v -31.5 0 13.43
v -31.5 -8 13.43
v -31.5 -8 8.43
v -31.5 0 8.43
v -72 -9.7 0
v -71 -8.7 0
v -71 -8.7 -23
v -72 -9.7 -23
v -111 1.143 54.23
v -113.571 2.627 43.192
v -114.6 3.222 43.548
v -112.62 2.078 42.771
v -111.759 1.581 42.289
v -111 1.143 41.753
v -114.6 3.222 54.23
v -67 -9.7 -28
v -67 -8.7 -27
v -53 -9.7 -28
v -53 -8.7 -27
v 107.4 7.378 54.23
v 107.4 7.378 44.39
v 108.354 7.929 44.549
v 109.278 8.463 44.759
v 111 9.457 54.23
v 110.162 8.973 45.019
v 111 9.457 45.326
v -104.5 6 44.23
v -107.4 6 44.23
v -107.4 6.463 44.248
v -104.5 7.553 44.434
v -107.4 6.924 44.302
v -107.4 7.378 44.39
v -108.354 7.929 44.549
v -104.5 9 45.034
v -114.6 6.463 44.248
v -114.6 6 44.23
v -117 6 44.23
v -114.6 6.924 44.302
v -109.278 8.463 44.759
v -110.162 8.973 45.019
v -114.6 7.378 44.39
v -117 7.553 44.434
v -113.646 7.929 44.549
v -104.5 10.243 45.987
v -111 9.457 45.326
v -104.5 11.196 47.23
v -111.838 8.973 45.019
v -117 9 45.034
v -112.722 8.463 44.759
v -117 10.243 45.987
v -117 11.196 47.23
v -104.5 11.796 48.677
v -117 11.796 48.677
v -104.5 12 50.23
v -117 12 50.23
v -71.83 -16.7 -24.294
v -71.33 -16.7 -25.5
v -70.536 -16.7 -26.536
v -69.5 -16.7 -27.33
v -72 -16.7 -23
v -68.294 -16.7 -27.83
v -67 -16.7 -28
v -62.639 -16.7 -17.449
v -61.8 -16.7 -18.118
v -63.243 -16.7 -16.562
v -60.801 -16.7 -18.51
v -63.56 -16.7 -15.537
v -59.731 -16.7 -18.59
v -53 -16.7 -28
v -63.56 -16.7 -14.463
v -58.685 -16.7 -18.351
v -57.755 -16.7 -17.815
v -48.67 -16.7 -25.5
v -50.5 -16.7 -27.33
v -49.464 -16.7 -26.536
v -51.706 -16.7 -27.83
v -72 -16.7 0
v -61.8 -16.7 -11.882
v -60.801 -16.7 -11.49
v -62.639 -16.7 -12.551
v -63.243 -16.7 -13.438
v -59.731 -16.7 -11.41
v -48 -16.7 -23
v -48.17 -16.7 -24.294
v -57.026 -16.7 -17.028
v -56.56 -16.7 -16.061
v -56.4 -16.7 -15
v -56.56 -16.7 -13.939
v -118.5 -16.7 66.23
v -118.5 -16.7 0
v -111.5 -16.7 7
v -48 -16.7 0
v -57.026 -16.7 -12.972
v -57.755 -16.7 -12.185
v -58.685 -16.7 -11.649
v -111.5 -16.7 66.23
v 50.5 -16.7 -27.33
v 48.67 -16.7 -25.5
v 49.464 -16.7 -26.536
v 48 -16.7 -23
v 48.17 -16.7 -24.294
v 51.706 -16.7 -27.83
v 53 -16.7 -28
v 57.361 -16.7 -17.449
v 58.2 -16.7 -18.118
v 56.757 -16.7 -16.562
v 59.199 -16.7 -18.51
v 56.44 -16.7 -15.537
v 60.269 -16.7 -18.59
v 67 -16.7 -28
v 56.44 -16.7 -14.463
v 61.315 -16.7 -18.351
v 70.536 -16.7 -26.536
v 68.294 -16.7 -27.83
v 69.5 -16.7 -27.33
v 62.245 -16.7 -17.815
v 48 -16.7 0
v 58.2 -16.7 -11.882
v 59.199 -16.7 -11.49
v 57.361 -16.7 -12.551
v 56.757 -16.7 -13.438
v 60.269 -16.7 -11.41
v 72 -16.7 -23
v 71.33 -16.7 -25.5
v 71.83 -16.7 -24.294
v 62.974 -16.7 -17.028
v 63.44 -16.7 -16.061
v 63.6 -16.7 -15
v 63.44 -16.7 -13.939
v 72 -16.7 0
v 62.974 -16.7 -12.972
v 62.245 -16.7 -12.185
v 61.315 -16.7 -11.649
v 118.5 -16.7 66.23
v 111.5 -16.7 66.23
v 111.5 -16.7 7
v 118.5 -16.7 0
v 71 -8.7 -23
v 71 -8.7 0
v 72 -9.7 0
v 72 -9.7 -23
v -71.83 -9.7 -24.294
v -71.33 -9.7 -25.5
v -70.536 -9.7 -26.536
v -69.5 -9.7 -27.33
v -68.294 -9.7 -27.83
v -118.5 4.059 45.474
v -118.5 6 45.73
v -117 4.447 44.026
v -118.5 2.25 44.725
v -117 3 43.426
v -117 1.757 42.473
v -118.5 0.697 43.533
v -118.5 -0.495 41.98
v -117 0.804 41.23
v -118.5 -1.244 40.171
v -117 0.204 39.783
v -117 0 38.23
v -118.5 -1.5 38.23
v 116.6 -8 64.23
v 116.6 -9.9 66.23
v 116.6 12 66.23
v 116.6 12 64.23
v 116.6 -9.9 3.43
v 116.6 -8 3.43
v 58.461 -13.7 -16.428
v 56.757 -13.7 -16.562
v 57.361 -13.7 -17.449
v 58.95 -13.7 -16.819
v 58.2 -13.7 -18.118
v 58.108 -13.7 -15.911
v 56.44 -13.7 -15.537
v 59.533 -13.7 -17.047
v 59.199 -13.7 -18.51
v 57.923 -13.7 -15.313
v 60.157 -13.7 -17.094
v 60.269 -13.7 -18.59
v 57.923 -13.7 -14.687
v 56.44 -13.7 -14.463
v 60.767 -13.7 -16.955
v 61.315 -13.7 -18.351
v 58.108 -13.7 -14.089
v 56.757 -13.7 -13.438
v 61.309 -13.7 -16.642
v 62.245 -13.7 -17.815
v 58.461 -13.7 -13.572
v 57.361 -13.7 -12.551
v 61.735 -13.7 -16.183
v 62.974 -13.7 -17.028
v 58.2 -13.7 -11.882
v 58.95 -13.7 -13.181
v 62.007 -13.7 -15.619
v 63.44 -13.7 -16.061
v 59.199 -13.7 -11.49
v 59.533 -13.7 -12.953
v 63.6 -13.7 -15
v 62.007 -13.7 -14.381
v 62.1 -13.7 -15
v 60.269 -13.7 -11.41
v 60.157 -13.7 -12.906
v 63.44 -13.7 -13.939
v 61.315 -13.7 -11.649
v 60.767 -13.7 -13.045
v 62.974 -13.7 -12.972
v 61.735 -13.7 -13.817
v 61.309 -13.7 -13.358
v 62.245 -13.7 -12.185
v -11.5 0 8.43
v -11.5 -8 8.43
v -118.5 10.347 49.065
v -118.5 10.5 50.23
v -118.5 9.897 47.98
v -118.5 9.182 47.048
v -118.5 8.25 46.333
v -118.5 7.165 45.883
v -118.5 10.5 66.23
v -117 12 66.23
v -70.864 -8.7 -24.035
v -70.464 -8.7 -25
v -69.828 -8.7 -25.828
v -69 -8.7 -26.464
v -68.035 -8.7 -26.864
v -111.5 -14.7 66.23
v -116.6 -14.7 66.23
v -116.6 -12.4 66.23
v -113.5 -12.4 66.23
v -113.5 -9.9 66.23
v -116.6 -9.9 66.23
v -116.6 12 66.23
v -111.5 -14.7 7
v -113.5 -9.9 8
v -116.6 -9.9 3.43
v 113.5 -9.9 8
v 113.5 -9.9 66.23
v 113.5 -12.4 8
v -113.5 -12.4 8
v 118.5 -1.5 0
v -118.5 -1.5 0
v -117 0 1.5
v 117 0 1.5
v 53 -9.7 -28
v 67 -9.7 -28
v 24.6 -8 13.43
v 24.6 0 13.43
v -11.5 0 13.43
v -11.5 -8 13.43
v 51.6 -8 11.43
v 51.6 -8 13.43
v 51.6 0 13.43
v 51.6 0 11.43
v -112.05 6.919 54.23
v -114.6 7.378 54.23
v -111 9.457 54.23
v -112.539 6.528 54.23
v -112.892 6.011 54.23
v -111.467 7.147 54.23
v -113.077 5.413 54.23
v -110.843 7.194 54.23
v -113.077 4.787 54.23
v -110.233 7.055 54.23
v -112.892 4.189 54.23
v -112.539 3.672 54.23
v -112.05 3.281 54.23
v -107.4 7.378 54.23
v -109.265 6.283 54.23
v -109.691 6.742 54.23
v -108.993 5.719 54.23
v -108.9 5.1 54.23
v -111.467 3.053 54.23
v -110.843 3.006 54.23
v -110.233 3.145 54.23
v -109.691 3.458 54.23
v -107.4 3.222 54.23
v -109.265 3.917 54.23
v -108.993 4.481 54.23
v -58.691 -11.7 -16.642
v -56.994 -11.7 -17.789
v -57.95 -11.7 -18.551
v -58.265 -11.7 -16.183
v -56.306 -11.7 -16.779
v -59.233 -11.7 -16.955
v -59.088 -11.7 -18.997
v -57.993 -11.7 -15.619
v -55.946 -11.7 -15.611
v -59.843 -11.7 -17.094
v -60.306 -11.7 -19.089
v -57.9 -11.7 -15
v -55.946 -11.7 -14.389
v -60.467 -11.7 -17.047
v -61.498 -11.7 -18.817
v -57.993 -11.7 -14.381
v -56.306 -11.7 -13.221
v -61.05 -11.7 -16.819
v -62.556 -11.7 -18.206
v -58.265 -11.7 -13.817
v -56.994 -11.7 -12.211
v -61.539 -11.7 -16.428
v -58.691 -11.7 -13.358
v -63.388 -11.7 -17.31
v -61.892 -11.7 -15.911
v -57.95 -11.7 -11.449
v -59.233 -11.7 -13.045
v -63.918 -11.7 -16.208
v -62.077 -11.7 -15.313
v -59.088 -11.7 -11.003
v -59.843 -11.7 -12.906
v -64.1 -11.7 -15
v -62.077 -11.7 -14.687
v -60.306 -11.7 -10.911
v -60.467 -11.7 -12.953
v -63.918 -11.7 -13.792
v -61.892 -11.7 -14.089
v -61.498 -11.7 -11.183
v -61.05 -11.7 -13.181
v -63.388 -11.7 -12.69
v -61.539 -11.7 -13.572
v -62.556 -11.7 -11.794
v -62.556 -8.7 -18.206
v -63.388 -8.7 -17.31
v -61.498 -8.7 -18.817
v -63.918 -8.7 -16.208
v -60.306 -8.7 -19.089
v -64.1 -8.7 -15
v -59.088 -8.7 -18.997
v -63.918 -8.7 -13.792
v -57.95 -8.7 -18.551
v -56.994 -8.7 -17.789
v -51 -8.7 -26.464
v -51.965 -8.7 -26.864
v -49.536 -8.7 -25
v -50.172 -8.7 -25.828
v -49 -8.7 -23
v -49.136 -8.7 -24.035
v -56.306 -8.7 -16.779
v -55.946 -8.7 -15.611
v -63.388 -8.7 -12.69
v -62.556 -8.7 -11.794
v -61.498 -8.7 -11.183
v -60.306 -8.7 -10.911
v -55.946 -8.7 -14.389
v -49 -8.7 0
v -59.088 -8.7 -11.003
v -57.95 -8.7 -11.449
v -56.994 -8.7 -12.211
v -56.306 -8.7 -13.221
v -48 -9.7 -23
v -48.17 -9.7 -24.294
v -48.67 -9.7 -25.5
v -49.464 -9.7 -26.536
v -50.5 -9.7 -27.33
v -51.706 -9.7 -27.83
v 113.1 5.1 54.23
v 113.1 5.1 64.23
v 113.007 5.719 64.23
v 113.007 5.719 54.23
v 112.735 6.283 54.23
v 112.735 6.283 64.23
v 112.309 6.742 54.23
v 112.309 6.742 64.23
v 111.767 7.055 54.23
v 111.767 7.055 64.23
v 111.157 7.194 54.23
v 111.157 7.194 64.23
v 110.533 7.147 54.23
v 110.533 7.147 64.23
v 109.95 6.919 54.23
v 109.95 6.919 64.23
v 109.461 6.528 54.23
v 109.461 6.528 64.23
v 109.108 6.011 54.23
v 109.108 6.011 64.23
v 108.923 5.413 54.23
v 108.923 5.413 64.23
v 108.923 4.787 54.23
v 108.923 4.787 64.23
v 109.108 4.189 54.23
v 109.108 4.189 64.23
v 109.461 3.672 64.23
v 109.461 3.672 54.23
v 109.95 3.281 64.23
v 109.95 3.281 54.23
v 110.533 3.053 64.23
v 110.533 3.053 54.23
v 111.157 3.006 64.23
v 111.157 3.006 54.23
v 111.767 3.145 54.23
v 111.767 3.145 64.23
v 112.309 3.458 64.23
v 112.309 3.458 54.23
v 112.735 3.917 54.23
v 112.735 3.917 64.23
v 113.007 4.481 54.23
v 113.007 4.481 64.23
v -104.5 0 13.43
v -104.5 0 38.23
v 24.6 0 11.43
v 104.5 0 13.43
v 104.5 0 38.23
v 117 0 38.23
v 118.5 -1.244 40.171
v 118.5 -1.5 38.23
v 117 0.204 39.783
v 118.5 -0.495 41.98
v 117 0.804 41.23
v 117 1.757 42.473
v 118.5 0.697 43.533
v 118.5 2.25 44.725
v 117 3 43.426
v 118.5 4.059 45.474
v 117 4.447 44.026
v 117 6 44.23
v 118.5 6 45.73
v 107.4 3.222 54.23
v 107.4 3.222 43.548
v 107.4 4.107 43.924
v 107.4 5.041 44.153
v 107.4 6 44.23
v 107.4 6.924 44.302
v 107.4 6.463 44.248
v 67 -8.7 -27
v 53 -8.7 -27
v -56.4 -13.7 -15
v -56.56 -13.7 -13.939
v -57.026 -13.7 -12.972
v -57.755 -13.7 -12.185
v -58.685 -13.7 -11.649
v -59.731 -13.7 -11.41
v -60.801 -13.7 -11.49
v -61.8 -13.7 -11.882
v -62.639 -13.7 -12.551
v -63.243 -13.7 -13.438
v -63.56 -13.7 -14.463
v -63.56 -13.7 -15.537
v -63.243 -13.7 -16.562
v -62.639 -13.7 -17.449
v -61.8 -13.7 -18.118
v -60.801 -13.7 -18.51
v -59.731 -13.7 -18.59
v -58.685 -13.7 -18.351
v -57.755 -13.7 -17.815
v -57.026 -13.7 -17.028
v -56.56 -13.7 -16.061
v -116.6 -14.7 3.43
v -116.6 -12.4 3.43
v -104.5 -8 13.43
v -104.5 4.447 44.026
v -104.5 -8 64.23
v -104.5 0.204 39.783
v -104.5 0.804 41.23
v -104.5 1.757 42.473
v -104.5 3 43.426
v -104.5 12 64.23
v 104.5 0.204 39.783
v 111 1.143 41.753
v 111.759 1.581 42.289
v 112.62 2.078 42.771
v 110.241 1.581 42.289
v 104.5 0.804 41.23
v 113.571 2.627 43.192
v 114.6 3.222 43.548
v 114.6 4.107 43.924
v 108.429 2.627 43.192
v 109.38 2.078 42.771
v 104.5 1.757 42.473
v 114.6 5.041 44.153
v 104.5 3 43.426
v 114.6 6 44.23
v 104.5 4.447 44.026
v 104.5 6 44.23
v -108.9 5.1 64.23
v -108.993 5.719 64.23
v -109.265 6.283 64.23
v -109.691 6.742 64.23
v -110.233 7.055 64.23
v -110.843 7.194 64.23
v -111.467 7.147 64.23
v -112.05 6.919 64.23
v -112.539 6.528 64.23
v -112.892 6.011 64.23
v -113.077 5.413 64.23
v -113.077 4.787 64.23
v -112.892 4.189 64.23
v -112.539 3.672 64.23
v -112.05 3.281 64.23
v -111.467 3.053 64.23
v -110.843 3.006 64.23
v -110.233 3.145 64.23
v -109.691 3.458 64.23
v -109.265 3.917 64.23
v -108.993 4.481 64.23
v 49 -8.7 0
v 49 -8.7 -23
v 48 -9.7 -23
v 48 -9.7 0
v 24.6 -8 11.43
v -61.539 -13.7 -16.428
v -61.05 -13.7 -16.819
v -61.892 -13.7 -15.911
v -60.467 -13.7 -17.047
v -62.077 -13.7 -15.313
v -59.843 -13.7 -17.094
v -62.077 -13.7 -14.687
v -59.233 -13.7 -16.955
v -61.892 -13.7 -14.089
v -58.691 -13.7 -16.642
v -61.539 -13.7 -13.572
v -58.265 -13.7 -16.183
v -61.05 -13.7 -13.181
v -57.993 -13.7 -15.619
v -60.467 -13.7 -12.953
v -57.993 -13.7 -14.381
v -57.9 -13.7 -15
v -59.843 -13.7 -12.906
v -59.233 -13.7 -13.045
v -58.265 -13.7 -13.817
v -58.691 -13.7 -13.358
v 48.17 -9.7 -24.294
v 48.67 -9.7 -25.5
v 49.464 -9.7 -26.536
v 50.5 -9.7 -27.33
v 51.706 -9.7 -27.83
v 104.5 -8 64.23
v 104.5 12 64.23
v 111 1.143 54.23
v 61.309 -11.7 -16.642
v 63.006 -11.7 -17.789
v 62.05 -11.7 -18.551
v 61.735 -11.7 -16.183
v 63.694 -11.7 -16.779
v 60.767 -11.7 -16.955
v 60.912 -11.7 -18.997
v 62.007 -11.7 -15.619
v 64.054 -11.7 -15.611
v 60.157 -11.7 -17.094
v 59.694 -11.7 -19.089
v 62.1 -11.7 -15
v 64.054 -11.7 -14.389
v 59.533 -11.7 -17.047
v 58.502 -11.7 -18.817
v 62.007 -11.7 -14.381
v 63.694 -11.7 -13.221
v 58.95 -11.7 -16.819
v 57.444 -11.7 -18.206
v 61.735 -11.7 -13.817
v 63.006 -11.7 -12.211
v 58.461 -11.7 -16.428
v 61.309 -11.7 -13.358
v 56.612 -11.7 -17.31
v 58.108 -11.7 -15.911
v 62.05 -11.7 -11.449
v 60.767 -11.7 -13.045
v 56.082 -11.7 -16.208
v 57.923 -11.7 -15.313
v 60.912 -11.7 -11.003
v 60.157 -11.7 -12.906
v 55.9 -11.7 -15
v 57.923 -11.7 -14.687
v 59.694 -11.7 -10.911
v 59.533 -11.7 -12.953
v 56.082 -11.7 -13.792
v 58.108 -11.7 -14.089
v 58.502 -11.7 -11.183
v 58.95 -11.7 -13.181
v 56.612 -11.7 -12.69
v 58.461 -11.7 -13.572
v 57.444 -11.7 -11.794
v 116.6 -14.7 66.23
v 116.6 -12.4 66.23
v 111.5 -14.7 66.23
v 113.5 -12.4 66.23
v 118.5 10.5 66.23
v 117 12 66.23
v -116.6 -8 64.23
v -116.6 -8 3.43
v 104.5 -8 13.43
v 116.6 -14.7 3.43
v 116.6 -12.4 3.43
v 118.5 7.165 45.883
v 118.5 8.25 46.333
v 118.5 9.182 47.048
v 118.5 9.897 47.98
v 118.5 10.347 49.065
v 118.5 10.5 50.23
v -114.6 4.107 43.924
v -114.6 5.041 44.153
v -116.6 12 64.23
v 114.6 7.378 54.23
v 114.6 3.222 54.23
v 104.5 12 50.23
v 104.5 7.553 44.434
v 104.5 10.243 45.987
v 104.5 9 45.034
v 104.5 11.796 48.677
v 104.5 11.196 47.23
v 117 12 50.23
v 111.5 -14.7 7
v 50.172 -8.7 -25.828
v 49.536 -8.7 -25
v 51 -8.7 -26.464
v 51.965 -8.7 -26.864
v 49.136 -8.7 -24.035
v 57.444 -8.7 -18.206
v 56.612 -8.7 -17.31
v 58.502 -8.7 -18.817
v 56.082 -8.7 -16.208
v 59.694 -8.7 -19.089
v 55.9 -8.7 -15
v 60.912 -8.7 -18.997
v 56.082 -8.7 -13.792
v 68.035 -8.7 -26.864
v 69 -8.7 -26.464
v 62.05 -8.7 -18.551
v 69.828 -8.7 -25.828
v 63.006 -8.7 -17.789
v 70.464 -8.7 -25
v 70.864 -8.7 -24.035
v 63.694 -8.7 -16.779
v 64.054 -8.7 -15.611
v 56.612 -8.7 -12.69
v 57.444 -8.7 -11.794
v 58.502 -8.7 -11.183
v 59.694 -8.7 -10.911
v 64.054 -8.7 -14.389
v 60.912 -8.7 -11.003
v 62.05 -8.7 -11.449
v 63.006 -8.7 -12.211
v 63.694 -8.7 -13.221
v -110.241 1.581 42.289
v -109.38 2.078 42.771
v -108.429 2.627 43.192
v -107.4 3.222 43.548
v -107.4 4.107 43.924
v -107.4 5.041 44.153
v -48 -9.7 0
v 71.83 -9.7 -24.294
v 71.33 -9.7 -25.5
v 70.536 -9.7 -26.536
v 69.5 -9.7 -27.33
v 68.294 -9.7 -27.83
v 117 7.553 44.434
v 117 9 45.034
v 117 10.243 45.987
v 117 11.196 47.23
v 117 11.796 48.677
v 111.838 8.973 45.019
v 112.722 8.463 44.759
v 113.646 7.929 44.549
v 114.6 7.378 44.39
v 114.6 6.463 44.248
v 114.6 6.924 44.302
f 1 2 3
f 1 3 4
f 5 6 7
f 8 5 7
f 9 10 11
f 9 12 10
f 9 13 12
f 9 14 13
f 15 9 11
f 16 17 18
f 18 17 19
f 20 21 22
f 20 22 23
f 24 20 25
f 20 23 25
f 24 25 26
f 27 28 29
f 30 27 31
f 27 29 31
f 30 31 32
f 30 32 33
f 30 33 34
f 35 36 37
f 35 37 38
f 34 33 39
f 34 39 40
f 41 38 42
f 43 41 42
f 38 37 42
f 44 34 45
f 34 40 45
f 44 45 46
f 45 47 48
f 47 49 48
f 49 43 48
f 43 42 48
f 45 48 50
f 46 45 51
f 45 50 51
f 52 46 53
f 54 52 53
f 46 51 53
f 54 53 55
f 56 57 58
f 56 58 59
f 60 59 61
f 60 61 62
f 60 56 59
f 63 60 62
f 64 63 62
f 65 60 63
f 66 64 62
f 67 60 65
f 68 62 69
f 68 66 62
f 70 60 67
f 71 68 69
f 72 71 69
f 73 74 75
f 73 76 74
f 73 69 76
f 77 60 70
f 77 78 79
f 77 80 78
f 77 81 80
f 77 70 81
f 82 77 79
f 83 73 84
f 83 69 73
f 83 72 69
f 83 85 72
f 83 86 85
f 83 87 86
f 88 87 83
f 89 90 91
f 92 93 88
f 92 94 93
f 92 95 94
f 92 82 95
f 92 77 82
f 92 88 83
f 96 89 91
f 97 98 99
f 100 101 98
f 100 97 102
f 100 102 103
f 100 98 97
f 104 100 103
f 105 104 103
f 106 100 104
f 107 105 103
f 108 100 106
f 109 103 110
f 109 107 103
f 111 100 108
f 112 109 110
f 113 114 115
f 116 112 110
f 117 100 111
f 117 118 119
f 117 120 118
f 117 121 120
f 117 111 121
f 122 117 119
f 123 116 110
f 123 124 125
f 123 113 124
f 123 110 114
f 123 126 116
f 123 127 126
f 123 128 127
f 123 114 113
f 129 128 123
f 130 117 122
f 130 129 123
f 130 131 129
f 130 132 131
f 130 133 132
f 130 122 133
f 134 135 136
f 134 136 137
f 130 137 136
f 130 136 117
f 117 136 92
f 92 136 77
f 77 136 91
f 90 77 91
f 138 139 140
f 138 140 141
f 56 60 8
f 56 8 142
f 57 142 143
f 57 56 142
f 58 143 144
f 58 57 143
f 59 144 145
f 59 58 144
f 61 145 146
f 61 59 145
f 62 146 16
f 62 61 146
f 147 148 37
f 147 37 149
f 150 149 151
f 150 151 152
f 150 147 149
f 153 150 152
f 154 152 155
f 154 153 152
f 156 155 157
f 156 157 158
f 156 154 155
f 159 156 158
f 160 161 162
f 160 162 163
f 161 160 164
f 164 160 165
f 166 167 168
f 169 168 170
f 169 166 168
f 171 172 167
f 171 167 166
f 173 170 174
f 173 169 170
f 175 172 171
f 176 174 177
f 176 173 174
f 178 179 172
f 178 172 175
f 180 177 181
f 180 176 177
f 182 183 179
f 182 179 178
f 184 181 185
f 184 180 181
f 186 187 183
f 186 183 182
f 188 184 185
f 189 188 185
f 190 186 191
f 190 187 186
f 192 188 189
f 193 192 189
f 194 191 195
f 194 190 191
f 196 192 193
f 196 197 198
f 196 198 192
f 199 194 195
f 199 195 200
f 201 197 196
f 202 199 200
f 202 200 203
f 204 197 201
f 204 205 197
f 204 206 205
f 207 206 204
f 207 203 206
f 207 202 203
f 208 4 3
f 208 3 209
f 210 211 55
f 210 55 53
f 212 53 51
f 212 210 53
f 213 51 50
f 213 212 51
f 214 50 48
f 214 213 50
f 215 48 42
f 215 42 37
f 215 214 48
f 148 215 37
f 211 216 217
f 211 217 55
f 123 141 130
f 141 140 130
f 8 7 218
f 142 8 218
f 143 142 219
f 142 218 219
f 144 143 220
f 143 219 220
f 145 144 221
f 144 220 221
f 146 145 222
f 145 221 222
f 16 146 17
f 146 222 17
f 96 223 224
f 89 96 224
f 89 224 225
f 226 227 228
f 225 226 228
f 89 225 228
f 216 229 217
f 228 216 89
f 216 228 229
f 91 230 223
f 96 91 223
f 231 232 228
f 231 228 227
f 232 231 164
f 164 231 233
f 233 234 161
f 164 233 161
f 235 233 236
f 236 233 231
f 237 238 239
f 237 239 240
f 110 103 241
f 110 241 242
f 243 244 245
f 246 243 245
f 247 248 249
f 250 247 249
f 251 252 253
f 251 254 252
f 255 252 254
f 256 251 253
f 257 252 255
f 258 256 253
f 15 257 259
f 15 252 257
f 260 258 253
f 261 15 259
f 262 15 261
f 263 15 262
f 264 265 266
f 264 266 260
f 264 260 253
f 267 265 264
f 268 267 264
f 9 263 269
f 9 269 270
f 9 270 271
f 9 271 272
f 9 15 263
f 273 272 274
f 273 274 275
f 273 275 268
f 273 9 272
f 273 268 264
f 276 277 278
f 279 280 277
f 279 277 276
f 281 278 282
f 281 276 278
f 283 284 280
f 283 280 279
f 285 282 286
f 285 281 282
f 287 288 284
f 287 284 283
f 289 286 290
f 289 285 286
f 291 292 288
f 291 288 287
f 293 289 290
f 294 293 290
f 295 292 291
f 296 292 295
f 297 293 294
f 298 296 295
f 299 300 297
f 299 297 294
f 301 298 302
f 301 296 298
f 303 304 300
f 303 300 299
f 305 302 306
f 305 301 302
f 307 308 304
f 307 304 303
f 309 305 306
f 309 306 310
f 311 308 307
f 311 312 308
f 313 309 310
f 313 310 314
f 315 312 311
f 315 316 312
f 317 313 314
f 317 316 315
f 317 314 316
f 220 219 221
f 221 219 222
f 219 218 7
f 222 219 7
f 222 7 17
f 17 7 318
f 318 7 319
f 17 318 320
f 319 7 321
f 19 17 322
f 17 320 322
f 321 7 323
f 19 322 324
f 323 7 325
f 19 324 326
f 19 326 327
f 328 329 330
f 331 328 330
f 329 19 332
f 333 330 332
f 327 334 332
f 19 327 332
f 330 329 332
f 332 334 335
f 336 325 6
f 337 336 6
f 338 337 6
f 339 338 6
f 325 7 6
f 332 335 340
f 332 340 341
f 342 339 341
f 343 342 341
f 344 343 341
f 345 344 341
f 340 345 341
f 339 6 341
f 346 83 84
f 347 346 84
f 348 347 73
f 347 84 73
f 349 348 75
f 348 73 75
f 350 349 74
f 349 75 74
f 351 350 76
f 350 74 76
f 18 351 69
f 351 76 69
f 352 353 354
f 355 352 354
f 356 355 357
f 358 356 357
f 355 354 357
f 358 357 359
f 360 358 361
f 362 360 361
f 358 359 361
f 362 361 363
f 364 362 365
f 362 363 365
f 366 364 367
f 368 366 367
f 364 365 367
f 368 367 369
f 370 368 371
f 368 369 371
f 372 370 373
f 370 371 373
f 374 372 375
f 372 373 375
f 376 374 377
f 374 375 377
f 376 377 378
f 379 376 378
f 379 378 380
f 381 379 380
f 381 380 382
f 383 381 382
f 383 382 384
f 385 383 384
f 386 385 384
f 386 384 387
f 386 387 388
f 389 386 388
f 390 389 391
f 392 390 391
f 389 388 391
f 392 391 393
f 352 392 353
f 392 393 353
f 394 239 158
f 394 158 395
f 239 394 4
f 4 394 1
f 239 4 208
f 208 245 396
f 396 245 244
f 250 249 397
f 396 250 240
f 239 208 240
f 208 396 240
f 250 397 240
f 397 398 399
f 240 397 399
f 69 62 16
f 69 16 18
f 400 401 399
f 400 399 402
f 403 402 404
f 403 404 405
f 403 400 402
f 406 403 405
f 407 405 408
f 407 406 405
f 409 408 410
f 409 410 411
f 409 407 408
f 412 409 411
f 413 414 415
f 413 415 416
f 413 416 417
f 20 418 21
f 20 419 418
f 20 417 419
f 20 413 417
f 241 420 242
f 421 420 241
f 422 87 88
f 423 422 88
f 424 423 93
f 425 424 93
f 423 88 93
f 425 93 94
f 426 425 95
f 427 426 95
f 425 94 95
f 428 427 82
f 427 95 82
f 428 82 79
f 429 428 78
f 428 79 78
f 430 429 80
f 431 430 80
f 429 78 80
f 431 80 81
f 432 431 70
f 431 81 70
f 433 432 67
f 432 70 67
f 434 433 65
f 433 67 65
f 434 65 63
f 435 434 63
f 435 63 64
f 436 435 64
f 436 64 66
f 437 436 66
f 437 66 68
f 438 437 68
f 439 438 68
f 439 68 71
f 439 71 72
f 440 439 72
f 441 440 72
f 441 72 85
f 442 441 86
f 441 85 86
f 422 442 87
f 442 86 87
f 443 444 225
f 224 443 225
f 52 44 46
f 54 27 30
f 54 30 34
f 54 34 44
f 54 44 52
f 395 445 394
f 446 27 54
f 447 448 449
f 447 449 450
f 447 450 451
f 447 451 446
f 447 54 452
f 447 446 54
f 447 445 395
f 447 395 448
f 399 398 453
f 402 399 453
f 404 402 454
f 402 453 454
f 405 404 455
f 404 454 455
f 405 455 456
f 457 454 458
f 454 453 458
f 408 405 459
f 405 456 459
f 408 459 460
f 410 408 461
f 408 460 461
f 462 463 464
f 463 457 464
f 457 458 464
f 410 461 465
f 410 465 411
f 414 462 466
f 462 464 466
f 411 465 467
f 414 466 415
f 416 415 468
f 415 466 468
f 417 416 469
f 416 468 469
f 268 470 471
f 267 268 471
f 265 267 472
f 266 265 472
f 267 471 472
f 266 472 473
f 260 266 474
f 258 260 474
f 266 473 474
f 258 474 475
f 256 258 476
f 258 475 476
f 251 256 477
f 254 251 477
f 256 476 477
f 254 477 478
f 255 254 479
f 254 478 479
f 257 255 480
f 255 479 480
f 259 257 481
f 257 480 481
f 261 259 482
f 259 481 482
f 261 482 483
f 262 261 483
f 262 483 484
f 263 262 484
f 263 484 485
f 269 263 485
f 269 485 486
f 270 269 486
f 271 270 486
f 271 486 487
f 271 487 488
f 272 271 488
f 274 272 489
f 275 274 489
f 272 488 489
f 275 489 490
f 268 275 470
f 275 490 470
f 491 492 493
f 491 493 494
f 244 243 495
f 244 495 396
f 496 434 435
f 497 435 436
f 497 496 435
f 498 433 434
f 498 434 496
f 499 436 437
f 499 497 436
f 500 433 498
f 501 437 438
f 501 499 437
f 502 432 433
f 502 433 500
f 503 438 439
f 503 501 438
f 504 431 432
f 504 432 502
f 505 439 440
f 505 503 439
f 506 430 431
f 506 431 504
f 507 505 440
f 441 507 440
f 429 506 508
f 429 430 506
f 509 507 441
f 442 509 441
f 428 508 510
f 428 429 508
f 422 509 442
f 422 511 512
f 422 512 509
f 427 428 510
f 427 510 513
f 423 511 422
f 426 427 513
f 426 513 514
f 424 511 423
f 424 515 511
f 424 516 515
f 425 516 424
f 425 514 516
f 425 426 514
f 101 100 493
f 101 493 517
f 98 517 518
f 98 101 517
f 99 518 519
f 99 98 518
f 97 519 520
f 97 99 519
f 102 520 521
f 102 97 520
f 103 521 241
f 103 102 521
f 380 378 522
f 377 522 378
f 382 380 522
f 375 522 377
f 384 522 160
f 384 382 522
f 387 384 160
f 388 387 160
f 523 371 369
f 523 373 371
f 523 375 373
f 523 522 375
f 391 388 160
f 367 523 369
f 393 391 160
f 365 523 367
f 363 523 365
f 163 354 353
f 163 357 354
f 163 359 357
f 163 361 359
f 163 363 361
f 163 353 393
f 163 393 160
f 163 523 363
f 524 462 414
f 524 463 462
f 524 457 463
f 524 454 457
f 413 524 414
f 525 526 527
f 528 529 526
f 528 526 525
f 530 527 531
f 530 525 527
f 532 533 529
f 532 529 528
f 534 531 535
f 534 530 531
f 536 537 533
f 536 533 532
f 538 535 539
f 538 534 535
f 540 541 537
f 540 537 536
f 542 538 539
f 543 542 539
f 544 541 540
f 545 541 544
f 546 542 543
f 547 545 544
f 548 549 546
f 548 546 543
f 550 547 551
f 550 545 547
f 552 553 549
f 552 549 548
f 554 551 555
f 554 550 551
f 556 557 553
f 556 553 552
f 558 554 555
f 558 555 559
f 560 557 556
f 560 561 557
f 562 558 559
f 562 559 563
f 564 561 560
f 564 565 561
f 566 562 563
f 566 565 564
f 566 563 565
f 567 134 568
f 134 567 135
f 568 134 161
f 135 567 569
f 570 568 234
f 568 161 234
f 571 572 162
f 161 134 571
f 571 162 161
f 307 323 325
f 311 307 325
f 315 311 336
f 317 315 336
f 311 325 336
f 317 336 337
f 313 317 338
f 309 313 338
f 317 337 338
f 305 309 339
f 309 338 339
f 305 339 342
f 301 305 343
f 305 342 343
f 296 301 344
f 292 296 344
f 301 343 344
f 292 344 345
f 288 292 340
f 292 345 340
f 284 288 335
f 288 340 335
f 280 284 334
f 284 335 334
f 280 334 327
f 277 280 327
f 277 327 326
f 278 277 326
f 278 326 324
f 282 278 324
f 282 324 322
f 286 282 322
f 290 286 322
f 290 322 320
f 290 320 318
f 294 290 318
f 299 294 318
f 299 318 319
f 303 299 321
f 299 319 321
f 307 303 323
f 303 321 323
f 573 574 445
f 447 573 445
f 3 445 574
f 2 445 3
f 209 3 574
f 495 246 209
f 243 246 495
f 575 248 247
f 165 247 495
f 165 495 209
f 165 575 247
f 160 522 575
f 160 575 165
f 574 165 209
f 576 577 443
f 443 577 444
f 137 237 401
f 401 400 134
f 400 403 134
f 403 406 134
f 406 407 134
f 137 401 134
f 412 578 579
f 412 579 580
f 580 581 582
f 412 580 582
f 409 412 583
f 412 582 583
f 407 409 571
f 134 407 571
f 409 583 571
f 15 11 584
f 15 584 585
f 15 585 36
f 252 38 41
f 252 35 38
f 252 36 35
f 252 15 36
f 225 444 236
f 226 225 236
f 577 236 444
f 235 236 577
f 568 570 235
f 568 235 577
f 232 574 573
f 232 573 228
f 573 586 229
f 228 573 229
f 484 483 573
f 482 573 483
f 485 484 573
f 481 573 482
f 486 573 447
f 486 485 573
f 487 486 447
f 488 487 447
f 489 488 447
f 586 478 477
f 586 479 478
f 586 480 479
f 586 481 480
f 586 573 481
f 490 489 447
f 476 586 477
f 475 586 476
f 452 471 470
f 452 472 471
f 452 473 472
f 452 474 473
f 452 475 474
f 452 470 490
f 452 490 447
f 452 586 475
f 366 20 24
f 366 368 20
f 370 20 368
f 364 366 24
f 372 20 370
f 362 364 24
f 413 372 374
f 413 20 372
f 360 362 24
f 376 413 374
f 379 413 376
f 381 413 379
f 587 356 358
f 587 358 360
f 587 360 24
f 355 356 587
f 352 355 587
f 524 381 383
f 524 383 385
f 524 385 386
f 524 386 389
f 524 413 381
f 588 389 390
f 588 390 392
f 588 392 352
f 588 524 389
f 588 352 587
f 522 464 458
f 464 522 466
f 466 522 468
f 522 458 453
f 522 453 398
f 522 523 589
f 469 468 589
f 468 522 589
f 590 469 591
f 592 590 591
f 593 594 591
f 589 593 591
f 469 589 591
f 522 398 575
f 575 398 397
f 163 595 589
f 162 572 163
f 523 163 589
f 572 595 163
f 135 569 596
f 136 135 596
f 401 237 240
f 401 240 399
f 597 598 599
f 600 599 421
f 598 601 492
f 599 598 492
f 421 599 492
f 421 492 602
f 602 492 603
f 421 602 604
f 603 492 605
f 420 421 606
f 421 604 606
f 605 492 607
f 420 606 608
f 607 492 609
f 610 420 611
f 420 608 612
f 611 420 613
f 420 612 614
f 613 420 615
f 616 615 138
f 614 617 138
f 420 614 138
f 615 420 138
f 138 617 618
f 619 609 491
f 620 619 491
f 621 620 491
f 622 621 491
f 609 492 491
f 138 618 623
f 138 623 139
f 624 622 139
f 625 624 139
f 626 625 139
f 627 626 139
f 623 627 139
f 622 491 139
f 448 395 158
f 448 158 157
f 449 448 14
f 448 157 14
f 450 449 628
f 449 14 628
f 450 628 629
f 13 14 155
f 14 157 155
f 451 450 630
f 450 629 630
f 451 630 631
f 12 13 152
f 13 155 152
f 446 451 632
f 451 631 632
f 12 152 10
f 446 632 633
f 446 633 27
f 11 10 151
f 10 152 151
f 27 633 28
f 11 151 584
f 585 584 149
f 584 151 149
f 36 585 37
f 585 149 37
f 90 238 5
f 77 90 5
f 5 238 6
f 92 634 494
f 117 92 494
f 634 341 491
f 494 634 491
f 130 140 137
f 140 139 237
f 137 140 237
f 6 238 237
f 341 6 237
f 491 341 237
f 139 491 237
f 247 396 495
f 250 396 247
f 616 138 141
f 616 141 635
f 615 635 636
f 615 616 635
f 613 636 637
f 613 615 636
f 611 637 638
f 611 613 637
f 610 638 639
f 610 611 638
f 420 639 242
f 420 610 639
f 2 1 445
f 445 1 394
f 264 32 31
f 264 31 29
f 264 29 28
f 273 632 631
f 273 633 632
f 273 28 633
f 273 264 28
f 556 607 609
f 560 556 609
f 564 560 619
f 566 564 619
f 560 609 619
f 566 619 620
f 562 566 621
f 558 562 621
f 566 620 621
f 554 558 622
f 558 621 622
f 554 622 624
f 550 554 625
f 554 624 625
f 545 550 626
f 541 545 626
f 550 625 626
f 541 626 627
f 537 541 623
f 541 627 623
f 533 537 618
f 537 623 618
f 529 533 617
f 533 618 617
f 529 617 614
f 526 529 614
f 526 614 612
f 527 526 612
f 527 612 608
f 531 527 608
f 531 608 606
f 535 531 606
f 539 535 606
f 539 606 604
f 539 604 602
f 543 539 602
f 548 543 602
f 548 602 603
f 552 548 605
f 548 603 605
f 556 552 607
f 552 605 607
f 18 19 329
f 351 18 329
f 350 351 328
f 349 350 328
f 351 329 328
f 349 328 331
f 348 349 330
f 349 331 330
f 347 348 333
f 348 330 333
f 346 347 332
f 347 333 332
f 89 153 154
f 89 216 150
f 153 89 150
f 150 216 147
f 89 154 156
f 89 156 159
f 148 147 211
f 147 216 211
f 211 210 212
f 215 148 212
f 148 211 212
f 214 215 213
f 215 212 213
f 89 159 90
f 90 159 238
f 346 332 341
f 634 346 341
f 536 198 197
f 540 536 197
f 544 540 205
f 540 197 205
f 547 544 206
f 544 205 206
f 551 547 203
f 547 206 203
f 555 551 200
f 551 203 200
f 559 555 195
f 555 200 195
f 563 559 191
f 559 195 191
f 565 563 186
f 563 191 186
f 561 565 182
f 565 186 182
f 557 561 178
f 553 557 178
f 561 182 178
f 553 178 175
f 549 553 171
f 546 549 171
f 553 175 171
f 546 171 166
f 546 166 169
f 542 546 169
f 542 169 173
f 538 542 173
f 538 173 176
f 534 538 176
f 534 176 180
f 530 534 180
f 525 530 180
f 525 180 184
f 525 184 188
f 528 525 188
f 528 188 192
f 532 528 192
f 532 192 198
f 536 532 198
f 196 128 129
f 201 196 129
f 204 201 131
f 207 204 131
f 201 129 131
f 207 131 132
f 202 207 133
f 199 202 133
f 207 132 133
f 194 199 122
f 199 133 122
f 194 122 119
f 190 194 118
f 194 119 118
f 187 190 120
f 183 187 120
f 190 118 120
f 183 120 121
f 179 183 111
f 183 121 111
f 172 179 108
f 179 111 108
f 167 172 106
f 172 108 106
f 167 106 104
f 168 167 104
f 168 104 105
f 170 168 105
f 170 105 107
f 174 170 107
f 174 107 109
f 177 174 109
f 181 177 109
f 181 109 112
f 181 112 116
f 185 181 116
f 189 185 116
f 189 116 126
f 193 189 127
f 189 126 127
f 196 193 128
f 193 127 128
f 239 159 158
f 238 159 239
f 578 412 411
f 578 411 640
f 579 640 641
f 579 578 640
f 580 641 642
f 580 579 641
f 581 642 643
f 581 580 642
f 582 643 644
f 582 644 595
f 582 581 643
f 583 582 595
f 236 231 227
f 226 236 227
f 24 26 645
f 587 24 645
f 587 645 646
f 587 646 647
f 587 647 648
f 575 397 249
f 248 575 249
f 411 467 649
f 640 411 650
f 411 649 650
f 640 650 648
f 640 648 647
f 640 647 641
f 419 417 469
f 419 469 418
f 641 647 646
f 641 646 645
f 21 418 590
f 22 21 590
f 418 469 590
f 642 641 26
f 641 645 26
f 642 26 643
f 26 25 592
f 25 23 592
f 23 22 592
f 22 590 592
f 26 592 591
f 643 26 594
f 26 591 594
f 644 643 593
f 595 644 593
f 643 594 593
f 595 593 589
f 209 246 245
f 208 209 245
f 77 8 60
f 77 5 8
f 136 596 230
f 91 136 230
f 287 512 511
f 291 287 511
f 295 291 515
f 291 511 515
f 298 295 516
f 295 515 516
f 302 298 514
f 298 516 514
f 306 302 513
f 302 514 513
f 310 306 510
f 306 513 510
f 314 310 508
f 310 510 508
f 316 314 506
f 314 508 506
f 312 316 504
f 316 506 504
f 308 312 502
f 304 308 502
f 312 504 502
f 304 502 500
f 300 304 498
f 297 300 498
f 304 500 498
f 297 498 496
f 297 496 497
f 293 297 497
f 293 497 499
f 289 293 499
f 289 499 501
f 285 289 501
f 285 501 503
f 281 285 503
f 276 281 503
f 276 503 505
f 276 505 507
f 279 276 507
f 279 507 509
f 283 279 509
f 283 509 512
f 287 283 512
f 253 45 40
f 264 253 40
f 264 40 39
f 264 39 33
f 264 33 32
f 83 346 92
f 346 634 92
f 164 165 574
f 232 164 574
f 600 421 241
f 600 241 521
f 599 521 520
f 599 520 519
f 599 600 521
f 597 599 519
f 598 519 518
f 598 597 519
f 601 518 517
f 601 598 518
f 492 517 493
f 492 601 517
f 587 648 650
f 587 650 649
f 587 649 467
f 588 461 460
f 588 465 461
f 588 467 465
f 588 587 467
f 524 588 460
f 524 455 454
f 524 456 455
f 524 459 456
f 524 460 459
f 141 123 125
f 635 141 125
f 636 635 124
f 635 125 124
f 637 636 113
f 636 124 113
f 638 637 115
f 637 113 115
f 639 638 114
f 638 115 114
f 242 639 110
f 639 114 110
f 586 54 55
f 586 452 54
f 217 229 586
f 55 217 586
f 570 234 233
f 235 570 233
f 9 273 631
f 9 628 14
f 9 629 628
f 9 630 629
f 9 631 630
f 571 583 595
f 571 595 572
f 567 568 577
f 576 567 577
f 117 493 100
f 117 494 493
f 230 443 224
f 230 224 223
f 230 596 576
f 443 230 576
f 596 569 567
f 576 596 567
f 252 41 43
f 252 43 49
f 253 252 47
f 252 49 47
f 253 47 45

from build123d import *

# Parameters (mm, degrees)
F1_DEPTH  = 8
F3_DEPTH  = 1.9
F5_DEPTH  = 2.5
F7_DEPTH  = 2.3
F9_W      = 14
F9_H      = 22
F10_DEPTH = 12
F11_DEPTH = 2
F12_W     = 12.1
F12_H     = 20
F13_W     = 12.1
F13_H     = 20
F14_DEPTH = 2
F17_R     = 5.99999
F18_R     = 5.99999
F19_DEPTH = 10
F20_DEPTH = 25
F22_R     = 2.1
F21_R     = 2.1
F23_DEPTH = 10
F24_SIZE  = 1.5
F25_W     = 24
F25_H     = 8
F26_DEPTH = 28
F28_R     = 4.1
F27_R     = 4.1
F29_DEPTH = 3
F30_R     = 2.1
F31_DEPTH = 28.701
F32_R     = 3.6
F33_DEPTH = 3
F34_R     = 5
F35_W     = 20
F35_H     = 8
F36_DEPTH = 5
F37_SIZE  = 1
F38_W     = 27
F38_H     = 8
F39_DEPTH = 2


# Not quite as in the source:
# - a fillet or chamfer is up to 0.001 mm smaller than in the source, because OpenCascade refuses the exact size
# - a feature names something its author has since deleted; it is built from what else it names


with BuildPart() as f1:
    # F0 (on Front) → F1 (new body)
    with BuildSketch(Plane.XZ):
        Polygon((-118.5, 0), (118.5, 0), (118.5, 66.23), (104.5, 66.23), (104.5, 13.43), (-104.5, 13.43), (-104.5, 66.23), (-118.5, 66.23), align=None)
    extrude(amount=F1_DEPTH)

    # F2 (on face) → F3 (join)
    with BuildSketch(Plane.XZ.offset(8)):
        Polygon((-116.6, 66.23), (-118.5, 66.23), (-118.5, 0), (118.5, 0), (118.5, 66.23), (116.6, 66.23), (116.6, 3.43), (-116.6, 3.43), align=None)
    extrude(amount=F3_DEPTH)

    # F4 (on face) → F5 (join)
    with BuildSketch(Plane.XZ.offset(9.9)):
        Polygon((-113.5, 66.23), (-118.5, 66.23), (-118.5, 0), (118.5, 0), (118.5, 66.23), (113.5, 66.23), (113.5, 8), (-113.5, 8), align=None)
    extrude(amount=F5_DEPTH)

    # F6 (on face) → F7 (join)
    with BuildSketch(Plane.XZ.offset(12.4)):
        Polygon((-116.6, 66.23), (-118.5, 66.23), (-118.5, 0), (118.5, 0), (118.5, 66.23), (116.6, 66.23), (116.6, 3.43), (-116.6, 3.43), align=None)
    extrude(amount=F7_DEPTH)

    # F9 (on face) → F10 (join)
    with BuildSketch(Plane(origin=(0, 0, 0), x_dir=(-1, 0, 0), z_dir=(0, 1, 0))):
        with Locations((111.5, 55.23)):
            Rectangle(F9_W, F9_H)
        with Locations((-111.5, 55.23)):
            Rectangle(F9_W, F9_H)
    extrude(amount=F10_DEPTH)

    # F8 (on face) → F11 (join)
    with BuildSketch(Plane.XZ.offset(14.7)):
        Polygon((-111.5, 66.23), (-118.5, 66.23), (-118.5, 0), (118.5, 0), (118.5, 66.23), (111.5, 66.23), (111.5, 7), (-111.5, 7), align=None)
    extrude(amount=F11_DEPTH)

    # F12 (on face) + F13 (on face) → F14 (cut)
    with BuildSketch(Plane.XY.offset(66.23)):
        with Locations((-110.55, 2)):
            Rectangle(F12_W, F12_H)
    with BuildSketch(Plane.XY.offset(66.23)):
        with Locations((110.55, 2)):
            Rectangle(F13_W, F13_H)
    extrude(amount=-F14_DEPTH, mode=Mode.SUBTRACT)

    # F17 (radius 6 in the source; OpenCascade refuses exactly that, so slightly less here)
    f17_edges = [f1.edges().sort_by_distance(p)[0] for p in [
        (-111.5, 0, 44.23),
        (-111.5, 12, 44.23),
    ]]
    fillet(f17_edges, radius=F17_R)

    # F18 (radius 6 in the source; OpenCascade refuses exactly that, so slightly less here)
    f18_edges = [f1.edges().sort_by_distance(p)[0] for p in [
        (111.5, 0, 44.23),
        (111.5, 12, 44.23),
    ]]
    fillet(f18_edges, radius=F18_R)

    # F15 (on face) + F16 (on face) → F19 (cut)
    with BuildSketch(Plane(origin=(0, 0, 44.23), x_dir=(1, 0, 0), z_dir=(0, 0, -1))):
        Polygon((111, -1.1430780618), (107.4, -3.2215390309), (107.4, -7.3784609691), (111, -9.4569219382), (114.6, -7.3784609691), (114.6, -3.2215390309), align=None)
    with BuildSketch(Plane(origin=(0, 0, 44.23), x_dir=(1, 0, 0), z_dir=(0, 0, -1))):
        Polygon((-107.4, -7.3784609691), (-107.4, -3.2215390309), (-111, -1.1430780618), (-114.6, -3.2215390309), (-114.6, -7.3784609691), (-111, -9.4569219382), align=None)
    extrude(amount=-F19_DEPTH, mode=Mode.SUBTRACT)

    # F15 (on face) + F16 (on face) → F20 (cut)
    with BuildSketch(Plane(origin=(0, 0, 44.23), x_dir=(1, 0, 0), z_dir=(0, 0, -1))):
        Polygon((111, -1.1430780618), (107.4, -3.2215390309), (107.4, -7.3784609691), (111, -9.4569219382), (114.6, -7.3784609691), (114.6, -3.2215390309), align=None)
    with BuildSketch(Plane(origin=(0, 0, 44.23), x_dir=(1, 0, 0), z_dir=(0, 0, -1))):
        Polygon((-107.4, -7.3784609691), (-107.4, -3.2215390309), (-111, -1.1430780618), (-114.6, -3.2215390309), (-114.6, -7.3784609691), (-111, -9.4569219382), align=None)
    extrude(amount=F20_DEPTH, mode=Mode.SUBTRACT)

    # F22 (on face) + F21 (on face) → F23 (cut, through all)
    with BuildSketch(Plane.XY.offset(64.23)):
        with Locations((111, 5.1)):
            Circle(F22_R)
    with BuildSketch(Plane.XY.offset(64.23)):
        with Locations((-111, 5.1)):
            Circle(F21_R)
    extrude(amount=-F23_DEPTH, mode=Mode.SUBTRACT)

    # F24
    f24_edges = [f1.edges().sort_by_distance(p)[0] for p in [
        (118.5, 0, 19.115005),
        (-118.5, 0, 19.115005),
        (0, 0, 0),
        (118.5, 12, 58.229995),
        (118.5, 10.242644, 45.987356),
        (118.5, 6, 44.23),
        (118.5, 1.757356, 42.472644),
        (-118.5, 1.757356, 42.472644),
        (-118.5, 6, 44.23),
        (-118.5, 10.242644, 45.987356),
        (-118.5, 12, 58.229995),
    ]]
    chamfer(f24_edges, length=F24_SIZE)

    # F25 (on face) → F26 (join)
    with BuildSketch(Plane(origin=(0, 0, 0), x_dir=(1, 0, 0), z_dir=(0, 0, -1))):
        with Locations((-60, 12.7)):
            Rectangle(F25_W, F25_H)
        with Locations((60, 12.7)):
            Rectangle(F25_W, F25_H)
    extrude(amount=F26_DEPTH)

    # F28 (on face) + F27 (on face) → F29 (cut)
    with BuildSketch(Plane(origin=(0, -8.7, 0), x_dir=(-1, 0, 0), z_dir=(0, 1, 0))):
        with Locations((-60, -15)):
            Circle(F28_R)
    with BuildSketch(Plane(origin=(0, -8.7, 0), x_dir=(-1, 0, 0), z_dir=(0, 1, 0))):
        with Locations((60, -15)):
            Circle(F27_R)
    extrude(amount=-F29_DEPTH, mode=Mode.SUBTRACT)

    # F30 (on face) → F31 (cut, through all)
    with BuildSketch(Plane.XZ.offset(16.7)):
        with Locations((-60, -15)):
            Circle(F30_R)
        with Locations((60, -15)):
            Circle(F30_R)
    extrude(amount=-F31_DEPTH, mode=Mode.SUBTRACT)

    # F32 (on face) → F33 (cut)
    with BuildSketch(Plane.XZ.offset(16.7)):
        with Locations((-60, -15)):
            Circle(F32_R)
        with Locations((60, -15)):
            Circle(F32_R)
    extrude(amount=-F33_DEPTH, mode=Mode.SUBTRACT)

    # F34
    f34_edges = [f1.edges().sort_by_distance(p)[0] for p in [
        (-72, -12.7, -28),
        (-48, -12.7, -28),
        (48, -12.7, -28),
        (72, -12.7, -28),
    ]]
    fillet(f34_edges, radius=F34_R)

    # F35 (on face) → F36 (cut)
    with BuildSketch(Plane.XY.offset(13.43)):
        with Locations((-21.5, -4)):
            Rectangle(F35_W, F35_H)
    extrude(amount=-F36_DEPTH, mode=Mode.SUBTRACT)

    # F37
    f37_edges = [f1.edges().sort_by_distance(p)[0] for p in [
        (-72, -8.7, -11.5),
        (72, -8.7, -11.5),
        (48, -8.7, -11.5),
        (-48, -8.7, -11.5),
        (-70.535534, -8.7, -26.535534),
        (-60, -8.7, -28),
        (-49.464466, -8.7, -26.535534),
        (49.464466, -8.7, -26.535534),
        (60, -8.7, -28),
        (70.535534, -8.7, -26.535534),
    ]]
    chamfer(f37_edges, length=F37_SIZE)

    # F38 (on face) → F39 (cut)
    with BuildSketch(Plane.XY.offset(13.43)):
        with Locations((38.1, -4)):
            Rectangle(F38_W, F38_H)
    extrude(amount=-F39_DEPTH, mode=Mode.SUBTRACT)


solid = f1.part
